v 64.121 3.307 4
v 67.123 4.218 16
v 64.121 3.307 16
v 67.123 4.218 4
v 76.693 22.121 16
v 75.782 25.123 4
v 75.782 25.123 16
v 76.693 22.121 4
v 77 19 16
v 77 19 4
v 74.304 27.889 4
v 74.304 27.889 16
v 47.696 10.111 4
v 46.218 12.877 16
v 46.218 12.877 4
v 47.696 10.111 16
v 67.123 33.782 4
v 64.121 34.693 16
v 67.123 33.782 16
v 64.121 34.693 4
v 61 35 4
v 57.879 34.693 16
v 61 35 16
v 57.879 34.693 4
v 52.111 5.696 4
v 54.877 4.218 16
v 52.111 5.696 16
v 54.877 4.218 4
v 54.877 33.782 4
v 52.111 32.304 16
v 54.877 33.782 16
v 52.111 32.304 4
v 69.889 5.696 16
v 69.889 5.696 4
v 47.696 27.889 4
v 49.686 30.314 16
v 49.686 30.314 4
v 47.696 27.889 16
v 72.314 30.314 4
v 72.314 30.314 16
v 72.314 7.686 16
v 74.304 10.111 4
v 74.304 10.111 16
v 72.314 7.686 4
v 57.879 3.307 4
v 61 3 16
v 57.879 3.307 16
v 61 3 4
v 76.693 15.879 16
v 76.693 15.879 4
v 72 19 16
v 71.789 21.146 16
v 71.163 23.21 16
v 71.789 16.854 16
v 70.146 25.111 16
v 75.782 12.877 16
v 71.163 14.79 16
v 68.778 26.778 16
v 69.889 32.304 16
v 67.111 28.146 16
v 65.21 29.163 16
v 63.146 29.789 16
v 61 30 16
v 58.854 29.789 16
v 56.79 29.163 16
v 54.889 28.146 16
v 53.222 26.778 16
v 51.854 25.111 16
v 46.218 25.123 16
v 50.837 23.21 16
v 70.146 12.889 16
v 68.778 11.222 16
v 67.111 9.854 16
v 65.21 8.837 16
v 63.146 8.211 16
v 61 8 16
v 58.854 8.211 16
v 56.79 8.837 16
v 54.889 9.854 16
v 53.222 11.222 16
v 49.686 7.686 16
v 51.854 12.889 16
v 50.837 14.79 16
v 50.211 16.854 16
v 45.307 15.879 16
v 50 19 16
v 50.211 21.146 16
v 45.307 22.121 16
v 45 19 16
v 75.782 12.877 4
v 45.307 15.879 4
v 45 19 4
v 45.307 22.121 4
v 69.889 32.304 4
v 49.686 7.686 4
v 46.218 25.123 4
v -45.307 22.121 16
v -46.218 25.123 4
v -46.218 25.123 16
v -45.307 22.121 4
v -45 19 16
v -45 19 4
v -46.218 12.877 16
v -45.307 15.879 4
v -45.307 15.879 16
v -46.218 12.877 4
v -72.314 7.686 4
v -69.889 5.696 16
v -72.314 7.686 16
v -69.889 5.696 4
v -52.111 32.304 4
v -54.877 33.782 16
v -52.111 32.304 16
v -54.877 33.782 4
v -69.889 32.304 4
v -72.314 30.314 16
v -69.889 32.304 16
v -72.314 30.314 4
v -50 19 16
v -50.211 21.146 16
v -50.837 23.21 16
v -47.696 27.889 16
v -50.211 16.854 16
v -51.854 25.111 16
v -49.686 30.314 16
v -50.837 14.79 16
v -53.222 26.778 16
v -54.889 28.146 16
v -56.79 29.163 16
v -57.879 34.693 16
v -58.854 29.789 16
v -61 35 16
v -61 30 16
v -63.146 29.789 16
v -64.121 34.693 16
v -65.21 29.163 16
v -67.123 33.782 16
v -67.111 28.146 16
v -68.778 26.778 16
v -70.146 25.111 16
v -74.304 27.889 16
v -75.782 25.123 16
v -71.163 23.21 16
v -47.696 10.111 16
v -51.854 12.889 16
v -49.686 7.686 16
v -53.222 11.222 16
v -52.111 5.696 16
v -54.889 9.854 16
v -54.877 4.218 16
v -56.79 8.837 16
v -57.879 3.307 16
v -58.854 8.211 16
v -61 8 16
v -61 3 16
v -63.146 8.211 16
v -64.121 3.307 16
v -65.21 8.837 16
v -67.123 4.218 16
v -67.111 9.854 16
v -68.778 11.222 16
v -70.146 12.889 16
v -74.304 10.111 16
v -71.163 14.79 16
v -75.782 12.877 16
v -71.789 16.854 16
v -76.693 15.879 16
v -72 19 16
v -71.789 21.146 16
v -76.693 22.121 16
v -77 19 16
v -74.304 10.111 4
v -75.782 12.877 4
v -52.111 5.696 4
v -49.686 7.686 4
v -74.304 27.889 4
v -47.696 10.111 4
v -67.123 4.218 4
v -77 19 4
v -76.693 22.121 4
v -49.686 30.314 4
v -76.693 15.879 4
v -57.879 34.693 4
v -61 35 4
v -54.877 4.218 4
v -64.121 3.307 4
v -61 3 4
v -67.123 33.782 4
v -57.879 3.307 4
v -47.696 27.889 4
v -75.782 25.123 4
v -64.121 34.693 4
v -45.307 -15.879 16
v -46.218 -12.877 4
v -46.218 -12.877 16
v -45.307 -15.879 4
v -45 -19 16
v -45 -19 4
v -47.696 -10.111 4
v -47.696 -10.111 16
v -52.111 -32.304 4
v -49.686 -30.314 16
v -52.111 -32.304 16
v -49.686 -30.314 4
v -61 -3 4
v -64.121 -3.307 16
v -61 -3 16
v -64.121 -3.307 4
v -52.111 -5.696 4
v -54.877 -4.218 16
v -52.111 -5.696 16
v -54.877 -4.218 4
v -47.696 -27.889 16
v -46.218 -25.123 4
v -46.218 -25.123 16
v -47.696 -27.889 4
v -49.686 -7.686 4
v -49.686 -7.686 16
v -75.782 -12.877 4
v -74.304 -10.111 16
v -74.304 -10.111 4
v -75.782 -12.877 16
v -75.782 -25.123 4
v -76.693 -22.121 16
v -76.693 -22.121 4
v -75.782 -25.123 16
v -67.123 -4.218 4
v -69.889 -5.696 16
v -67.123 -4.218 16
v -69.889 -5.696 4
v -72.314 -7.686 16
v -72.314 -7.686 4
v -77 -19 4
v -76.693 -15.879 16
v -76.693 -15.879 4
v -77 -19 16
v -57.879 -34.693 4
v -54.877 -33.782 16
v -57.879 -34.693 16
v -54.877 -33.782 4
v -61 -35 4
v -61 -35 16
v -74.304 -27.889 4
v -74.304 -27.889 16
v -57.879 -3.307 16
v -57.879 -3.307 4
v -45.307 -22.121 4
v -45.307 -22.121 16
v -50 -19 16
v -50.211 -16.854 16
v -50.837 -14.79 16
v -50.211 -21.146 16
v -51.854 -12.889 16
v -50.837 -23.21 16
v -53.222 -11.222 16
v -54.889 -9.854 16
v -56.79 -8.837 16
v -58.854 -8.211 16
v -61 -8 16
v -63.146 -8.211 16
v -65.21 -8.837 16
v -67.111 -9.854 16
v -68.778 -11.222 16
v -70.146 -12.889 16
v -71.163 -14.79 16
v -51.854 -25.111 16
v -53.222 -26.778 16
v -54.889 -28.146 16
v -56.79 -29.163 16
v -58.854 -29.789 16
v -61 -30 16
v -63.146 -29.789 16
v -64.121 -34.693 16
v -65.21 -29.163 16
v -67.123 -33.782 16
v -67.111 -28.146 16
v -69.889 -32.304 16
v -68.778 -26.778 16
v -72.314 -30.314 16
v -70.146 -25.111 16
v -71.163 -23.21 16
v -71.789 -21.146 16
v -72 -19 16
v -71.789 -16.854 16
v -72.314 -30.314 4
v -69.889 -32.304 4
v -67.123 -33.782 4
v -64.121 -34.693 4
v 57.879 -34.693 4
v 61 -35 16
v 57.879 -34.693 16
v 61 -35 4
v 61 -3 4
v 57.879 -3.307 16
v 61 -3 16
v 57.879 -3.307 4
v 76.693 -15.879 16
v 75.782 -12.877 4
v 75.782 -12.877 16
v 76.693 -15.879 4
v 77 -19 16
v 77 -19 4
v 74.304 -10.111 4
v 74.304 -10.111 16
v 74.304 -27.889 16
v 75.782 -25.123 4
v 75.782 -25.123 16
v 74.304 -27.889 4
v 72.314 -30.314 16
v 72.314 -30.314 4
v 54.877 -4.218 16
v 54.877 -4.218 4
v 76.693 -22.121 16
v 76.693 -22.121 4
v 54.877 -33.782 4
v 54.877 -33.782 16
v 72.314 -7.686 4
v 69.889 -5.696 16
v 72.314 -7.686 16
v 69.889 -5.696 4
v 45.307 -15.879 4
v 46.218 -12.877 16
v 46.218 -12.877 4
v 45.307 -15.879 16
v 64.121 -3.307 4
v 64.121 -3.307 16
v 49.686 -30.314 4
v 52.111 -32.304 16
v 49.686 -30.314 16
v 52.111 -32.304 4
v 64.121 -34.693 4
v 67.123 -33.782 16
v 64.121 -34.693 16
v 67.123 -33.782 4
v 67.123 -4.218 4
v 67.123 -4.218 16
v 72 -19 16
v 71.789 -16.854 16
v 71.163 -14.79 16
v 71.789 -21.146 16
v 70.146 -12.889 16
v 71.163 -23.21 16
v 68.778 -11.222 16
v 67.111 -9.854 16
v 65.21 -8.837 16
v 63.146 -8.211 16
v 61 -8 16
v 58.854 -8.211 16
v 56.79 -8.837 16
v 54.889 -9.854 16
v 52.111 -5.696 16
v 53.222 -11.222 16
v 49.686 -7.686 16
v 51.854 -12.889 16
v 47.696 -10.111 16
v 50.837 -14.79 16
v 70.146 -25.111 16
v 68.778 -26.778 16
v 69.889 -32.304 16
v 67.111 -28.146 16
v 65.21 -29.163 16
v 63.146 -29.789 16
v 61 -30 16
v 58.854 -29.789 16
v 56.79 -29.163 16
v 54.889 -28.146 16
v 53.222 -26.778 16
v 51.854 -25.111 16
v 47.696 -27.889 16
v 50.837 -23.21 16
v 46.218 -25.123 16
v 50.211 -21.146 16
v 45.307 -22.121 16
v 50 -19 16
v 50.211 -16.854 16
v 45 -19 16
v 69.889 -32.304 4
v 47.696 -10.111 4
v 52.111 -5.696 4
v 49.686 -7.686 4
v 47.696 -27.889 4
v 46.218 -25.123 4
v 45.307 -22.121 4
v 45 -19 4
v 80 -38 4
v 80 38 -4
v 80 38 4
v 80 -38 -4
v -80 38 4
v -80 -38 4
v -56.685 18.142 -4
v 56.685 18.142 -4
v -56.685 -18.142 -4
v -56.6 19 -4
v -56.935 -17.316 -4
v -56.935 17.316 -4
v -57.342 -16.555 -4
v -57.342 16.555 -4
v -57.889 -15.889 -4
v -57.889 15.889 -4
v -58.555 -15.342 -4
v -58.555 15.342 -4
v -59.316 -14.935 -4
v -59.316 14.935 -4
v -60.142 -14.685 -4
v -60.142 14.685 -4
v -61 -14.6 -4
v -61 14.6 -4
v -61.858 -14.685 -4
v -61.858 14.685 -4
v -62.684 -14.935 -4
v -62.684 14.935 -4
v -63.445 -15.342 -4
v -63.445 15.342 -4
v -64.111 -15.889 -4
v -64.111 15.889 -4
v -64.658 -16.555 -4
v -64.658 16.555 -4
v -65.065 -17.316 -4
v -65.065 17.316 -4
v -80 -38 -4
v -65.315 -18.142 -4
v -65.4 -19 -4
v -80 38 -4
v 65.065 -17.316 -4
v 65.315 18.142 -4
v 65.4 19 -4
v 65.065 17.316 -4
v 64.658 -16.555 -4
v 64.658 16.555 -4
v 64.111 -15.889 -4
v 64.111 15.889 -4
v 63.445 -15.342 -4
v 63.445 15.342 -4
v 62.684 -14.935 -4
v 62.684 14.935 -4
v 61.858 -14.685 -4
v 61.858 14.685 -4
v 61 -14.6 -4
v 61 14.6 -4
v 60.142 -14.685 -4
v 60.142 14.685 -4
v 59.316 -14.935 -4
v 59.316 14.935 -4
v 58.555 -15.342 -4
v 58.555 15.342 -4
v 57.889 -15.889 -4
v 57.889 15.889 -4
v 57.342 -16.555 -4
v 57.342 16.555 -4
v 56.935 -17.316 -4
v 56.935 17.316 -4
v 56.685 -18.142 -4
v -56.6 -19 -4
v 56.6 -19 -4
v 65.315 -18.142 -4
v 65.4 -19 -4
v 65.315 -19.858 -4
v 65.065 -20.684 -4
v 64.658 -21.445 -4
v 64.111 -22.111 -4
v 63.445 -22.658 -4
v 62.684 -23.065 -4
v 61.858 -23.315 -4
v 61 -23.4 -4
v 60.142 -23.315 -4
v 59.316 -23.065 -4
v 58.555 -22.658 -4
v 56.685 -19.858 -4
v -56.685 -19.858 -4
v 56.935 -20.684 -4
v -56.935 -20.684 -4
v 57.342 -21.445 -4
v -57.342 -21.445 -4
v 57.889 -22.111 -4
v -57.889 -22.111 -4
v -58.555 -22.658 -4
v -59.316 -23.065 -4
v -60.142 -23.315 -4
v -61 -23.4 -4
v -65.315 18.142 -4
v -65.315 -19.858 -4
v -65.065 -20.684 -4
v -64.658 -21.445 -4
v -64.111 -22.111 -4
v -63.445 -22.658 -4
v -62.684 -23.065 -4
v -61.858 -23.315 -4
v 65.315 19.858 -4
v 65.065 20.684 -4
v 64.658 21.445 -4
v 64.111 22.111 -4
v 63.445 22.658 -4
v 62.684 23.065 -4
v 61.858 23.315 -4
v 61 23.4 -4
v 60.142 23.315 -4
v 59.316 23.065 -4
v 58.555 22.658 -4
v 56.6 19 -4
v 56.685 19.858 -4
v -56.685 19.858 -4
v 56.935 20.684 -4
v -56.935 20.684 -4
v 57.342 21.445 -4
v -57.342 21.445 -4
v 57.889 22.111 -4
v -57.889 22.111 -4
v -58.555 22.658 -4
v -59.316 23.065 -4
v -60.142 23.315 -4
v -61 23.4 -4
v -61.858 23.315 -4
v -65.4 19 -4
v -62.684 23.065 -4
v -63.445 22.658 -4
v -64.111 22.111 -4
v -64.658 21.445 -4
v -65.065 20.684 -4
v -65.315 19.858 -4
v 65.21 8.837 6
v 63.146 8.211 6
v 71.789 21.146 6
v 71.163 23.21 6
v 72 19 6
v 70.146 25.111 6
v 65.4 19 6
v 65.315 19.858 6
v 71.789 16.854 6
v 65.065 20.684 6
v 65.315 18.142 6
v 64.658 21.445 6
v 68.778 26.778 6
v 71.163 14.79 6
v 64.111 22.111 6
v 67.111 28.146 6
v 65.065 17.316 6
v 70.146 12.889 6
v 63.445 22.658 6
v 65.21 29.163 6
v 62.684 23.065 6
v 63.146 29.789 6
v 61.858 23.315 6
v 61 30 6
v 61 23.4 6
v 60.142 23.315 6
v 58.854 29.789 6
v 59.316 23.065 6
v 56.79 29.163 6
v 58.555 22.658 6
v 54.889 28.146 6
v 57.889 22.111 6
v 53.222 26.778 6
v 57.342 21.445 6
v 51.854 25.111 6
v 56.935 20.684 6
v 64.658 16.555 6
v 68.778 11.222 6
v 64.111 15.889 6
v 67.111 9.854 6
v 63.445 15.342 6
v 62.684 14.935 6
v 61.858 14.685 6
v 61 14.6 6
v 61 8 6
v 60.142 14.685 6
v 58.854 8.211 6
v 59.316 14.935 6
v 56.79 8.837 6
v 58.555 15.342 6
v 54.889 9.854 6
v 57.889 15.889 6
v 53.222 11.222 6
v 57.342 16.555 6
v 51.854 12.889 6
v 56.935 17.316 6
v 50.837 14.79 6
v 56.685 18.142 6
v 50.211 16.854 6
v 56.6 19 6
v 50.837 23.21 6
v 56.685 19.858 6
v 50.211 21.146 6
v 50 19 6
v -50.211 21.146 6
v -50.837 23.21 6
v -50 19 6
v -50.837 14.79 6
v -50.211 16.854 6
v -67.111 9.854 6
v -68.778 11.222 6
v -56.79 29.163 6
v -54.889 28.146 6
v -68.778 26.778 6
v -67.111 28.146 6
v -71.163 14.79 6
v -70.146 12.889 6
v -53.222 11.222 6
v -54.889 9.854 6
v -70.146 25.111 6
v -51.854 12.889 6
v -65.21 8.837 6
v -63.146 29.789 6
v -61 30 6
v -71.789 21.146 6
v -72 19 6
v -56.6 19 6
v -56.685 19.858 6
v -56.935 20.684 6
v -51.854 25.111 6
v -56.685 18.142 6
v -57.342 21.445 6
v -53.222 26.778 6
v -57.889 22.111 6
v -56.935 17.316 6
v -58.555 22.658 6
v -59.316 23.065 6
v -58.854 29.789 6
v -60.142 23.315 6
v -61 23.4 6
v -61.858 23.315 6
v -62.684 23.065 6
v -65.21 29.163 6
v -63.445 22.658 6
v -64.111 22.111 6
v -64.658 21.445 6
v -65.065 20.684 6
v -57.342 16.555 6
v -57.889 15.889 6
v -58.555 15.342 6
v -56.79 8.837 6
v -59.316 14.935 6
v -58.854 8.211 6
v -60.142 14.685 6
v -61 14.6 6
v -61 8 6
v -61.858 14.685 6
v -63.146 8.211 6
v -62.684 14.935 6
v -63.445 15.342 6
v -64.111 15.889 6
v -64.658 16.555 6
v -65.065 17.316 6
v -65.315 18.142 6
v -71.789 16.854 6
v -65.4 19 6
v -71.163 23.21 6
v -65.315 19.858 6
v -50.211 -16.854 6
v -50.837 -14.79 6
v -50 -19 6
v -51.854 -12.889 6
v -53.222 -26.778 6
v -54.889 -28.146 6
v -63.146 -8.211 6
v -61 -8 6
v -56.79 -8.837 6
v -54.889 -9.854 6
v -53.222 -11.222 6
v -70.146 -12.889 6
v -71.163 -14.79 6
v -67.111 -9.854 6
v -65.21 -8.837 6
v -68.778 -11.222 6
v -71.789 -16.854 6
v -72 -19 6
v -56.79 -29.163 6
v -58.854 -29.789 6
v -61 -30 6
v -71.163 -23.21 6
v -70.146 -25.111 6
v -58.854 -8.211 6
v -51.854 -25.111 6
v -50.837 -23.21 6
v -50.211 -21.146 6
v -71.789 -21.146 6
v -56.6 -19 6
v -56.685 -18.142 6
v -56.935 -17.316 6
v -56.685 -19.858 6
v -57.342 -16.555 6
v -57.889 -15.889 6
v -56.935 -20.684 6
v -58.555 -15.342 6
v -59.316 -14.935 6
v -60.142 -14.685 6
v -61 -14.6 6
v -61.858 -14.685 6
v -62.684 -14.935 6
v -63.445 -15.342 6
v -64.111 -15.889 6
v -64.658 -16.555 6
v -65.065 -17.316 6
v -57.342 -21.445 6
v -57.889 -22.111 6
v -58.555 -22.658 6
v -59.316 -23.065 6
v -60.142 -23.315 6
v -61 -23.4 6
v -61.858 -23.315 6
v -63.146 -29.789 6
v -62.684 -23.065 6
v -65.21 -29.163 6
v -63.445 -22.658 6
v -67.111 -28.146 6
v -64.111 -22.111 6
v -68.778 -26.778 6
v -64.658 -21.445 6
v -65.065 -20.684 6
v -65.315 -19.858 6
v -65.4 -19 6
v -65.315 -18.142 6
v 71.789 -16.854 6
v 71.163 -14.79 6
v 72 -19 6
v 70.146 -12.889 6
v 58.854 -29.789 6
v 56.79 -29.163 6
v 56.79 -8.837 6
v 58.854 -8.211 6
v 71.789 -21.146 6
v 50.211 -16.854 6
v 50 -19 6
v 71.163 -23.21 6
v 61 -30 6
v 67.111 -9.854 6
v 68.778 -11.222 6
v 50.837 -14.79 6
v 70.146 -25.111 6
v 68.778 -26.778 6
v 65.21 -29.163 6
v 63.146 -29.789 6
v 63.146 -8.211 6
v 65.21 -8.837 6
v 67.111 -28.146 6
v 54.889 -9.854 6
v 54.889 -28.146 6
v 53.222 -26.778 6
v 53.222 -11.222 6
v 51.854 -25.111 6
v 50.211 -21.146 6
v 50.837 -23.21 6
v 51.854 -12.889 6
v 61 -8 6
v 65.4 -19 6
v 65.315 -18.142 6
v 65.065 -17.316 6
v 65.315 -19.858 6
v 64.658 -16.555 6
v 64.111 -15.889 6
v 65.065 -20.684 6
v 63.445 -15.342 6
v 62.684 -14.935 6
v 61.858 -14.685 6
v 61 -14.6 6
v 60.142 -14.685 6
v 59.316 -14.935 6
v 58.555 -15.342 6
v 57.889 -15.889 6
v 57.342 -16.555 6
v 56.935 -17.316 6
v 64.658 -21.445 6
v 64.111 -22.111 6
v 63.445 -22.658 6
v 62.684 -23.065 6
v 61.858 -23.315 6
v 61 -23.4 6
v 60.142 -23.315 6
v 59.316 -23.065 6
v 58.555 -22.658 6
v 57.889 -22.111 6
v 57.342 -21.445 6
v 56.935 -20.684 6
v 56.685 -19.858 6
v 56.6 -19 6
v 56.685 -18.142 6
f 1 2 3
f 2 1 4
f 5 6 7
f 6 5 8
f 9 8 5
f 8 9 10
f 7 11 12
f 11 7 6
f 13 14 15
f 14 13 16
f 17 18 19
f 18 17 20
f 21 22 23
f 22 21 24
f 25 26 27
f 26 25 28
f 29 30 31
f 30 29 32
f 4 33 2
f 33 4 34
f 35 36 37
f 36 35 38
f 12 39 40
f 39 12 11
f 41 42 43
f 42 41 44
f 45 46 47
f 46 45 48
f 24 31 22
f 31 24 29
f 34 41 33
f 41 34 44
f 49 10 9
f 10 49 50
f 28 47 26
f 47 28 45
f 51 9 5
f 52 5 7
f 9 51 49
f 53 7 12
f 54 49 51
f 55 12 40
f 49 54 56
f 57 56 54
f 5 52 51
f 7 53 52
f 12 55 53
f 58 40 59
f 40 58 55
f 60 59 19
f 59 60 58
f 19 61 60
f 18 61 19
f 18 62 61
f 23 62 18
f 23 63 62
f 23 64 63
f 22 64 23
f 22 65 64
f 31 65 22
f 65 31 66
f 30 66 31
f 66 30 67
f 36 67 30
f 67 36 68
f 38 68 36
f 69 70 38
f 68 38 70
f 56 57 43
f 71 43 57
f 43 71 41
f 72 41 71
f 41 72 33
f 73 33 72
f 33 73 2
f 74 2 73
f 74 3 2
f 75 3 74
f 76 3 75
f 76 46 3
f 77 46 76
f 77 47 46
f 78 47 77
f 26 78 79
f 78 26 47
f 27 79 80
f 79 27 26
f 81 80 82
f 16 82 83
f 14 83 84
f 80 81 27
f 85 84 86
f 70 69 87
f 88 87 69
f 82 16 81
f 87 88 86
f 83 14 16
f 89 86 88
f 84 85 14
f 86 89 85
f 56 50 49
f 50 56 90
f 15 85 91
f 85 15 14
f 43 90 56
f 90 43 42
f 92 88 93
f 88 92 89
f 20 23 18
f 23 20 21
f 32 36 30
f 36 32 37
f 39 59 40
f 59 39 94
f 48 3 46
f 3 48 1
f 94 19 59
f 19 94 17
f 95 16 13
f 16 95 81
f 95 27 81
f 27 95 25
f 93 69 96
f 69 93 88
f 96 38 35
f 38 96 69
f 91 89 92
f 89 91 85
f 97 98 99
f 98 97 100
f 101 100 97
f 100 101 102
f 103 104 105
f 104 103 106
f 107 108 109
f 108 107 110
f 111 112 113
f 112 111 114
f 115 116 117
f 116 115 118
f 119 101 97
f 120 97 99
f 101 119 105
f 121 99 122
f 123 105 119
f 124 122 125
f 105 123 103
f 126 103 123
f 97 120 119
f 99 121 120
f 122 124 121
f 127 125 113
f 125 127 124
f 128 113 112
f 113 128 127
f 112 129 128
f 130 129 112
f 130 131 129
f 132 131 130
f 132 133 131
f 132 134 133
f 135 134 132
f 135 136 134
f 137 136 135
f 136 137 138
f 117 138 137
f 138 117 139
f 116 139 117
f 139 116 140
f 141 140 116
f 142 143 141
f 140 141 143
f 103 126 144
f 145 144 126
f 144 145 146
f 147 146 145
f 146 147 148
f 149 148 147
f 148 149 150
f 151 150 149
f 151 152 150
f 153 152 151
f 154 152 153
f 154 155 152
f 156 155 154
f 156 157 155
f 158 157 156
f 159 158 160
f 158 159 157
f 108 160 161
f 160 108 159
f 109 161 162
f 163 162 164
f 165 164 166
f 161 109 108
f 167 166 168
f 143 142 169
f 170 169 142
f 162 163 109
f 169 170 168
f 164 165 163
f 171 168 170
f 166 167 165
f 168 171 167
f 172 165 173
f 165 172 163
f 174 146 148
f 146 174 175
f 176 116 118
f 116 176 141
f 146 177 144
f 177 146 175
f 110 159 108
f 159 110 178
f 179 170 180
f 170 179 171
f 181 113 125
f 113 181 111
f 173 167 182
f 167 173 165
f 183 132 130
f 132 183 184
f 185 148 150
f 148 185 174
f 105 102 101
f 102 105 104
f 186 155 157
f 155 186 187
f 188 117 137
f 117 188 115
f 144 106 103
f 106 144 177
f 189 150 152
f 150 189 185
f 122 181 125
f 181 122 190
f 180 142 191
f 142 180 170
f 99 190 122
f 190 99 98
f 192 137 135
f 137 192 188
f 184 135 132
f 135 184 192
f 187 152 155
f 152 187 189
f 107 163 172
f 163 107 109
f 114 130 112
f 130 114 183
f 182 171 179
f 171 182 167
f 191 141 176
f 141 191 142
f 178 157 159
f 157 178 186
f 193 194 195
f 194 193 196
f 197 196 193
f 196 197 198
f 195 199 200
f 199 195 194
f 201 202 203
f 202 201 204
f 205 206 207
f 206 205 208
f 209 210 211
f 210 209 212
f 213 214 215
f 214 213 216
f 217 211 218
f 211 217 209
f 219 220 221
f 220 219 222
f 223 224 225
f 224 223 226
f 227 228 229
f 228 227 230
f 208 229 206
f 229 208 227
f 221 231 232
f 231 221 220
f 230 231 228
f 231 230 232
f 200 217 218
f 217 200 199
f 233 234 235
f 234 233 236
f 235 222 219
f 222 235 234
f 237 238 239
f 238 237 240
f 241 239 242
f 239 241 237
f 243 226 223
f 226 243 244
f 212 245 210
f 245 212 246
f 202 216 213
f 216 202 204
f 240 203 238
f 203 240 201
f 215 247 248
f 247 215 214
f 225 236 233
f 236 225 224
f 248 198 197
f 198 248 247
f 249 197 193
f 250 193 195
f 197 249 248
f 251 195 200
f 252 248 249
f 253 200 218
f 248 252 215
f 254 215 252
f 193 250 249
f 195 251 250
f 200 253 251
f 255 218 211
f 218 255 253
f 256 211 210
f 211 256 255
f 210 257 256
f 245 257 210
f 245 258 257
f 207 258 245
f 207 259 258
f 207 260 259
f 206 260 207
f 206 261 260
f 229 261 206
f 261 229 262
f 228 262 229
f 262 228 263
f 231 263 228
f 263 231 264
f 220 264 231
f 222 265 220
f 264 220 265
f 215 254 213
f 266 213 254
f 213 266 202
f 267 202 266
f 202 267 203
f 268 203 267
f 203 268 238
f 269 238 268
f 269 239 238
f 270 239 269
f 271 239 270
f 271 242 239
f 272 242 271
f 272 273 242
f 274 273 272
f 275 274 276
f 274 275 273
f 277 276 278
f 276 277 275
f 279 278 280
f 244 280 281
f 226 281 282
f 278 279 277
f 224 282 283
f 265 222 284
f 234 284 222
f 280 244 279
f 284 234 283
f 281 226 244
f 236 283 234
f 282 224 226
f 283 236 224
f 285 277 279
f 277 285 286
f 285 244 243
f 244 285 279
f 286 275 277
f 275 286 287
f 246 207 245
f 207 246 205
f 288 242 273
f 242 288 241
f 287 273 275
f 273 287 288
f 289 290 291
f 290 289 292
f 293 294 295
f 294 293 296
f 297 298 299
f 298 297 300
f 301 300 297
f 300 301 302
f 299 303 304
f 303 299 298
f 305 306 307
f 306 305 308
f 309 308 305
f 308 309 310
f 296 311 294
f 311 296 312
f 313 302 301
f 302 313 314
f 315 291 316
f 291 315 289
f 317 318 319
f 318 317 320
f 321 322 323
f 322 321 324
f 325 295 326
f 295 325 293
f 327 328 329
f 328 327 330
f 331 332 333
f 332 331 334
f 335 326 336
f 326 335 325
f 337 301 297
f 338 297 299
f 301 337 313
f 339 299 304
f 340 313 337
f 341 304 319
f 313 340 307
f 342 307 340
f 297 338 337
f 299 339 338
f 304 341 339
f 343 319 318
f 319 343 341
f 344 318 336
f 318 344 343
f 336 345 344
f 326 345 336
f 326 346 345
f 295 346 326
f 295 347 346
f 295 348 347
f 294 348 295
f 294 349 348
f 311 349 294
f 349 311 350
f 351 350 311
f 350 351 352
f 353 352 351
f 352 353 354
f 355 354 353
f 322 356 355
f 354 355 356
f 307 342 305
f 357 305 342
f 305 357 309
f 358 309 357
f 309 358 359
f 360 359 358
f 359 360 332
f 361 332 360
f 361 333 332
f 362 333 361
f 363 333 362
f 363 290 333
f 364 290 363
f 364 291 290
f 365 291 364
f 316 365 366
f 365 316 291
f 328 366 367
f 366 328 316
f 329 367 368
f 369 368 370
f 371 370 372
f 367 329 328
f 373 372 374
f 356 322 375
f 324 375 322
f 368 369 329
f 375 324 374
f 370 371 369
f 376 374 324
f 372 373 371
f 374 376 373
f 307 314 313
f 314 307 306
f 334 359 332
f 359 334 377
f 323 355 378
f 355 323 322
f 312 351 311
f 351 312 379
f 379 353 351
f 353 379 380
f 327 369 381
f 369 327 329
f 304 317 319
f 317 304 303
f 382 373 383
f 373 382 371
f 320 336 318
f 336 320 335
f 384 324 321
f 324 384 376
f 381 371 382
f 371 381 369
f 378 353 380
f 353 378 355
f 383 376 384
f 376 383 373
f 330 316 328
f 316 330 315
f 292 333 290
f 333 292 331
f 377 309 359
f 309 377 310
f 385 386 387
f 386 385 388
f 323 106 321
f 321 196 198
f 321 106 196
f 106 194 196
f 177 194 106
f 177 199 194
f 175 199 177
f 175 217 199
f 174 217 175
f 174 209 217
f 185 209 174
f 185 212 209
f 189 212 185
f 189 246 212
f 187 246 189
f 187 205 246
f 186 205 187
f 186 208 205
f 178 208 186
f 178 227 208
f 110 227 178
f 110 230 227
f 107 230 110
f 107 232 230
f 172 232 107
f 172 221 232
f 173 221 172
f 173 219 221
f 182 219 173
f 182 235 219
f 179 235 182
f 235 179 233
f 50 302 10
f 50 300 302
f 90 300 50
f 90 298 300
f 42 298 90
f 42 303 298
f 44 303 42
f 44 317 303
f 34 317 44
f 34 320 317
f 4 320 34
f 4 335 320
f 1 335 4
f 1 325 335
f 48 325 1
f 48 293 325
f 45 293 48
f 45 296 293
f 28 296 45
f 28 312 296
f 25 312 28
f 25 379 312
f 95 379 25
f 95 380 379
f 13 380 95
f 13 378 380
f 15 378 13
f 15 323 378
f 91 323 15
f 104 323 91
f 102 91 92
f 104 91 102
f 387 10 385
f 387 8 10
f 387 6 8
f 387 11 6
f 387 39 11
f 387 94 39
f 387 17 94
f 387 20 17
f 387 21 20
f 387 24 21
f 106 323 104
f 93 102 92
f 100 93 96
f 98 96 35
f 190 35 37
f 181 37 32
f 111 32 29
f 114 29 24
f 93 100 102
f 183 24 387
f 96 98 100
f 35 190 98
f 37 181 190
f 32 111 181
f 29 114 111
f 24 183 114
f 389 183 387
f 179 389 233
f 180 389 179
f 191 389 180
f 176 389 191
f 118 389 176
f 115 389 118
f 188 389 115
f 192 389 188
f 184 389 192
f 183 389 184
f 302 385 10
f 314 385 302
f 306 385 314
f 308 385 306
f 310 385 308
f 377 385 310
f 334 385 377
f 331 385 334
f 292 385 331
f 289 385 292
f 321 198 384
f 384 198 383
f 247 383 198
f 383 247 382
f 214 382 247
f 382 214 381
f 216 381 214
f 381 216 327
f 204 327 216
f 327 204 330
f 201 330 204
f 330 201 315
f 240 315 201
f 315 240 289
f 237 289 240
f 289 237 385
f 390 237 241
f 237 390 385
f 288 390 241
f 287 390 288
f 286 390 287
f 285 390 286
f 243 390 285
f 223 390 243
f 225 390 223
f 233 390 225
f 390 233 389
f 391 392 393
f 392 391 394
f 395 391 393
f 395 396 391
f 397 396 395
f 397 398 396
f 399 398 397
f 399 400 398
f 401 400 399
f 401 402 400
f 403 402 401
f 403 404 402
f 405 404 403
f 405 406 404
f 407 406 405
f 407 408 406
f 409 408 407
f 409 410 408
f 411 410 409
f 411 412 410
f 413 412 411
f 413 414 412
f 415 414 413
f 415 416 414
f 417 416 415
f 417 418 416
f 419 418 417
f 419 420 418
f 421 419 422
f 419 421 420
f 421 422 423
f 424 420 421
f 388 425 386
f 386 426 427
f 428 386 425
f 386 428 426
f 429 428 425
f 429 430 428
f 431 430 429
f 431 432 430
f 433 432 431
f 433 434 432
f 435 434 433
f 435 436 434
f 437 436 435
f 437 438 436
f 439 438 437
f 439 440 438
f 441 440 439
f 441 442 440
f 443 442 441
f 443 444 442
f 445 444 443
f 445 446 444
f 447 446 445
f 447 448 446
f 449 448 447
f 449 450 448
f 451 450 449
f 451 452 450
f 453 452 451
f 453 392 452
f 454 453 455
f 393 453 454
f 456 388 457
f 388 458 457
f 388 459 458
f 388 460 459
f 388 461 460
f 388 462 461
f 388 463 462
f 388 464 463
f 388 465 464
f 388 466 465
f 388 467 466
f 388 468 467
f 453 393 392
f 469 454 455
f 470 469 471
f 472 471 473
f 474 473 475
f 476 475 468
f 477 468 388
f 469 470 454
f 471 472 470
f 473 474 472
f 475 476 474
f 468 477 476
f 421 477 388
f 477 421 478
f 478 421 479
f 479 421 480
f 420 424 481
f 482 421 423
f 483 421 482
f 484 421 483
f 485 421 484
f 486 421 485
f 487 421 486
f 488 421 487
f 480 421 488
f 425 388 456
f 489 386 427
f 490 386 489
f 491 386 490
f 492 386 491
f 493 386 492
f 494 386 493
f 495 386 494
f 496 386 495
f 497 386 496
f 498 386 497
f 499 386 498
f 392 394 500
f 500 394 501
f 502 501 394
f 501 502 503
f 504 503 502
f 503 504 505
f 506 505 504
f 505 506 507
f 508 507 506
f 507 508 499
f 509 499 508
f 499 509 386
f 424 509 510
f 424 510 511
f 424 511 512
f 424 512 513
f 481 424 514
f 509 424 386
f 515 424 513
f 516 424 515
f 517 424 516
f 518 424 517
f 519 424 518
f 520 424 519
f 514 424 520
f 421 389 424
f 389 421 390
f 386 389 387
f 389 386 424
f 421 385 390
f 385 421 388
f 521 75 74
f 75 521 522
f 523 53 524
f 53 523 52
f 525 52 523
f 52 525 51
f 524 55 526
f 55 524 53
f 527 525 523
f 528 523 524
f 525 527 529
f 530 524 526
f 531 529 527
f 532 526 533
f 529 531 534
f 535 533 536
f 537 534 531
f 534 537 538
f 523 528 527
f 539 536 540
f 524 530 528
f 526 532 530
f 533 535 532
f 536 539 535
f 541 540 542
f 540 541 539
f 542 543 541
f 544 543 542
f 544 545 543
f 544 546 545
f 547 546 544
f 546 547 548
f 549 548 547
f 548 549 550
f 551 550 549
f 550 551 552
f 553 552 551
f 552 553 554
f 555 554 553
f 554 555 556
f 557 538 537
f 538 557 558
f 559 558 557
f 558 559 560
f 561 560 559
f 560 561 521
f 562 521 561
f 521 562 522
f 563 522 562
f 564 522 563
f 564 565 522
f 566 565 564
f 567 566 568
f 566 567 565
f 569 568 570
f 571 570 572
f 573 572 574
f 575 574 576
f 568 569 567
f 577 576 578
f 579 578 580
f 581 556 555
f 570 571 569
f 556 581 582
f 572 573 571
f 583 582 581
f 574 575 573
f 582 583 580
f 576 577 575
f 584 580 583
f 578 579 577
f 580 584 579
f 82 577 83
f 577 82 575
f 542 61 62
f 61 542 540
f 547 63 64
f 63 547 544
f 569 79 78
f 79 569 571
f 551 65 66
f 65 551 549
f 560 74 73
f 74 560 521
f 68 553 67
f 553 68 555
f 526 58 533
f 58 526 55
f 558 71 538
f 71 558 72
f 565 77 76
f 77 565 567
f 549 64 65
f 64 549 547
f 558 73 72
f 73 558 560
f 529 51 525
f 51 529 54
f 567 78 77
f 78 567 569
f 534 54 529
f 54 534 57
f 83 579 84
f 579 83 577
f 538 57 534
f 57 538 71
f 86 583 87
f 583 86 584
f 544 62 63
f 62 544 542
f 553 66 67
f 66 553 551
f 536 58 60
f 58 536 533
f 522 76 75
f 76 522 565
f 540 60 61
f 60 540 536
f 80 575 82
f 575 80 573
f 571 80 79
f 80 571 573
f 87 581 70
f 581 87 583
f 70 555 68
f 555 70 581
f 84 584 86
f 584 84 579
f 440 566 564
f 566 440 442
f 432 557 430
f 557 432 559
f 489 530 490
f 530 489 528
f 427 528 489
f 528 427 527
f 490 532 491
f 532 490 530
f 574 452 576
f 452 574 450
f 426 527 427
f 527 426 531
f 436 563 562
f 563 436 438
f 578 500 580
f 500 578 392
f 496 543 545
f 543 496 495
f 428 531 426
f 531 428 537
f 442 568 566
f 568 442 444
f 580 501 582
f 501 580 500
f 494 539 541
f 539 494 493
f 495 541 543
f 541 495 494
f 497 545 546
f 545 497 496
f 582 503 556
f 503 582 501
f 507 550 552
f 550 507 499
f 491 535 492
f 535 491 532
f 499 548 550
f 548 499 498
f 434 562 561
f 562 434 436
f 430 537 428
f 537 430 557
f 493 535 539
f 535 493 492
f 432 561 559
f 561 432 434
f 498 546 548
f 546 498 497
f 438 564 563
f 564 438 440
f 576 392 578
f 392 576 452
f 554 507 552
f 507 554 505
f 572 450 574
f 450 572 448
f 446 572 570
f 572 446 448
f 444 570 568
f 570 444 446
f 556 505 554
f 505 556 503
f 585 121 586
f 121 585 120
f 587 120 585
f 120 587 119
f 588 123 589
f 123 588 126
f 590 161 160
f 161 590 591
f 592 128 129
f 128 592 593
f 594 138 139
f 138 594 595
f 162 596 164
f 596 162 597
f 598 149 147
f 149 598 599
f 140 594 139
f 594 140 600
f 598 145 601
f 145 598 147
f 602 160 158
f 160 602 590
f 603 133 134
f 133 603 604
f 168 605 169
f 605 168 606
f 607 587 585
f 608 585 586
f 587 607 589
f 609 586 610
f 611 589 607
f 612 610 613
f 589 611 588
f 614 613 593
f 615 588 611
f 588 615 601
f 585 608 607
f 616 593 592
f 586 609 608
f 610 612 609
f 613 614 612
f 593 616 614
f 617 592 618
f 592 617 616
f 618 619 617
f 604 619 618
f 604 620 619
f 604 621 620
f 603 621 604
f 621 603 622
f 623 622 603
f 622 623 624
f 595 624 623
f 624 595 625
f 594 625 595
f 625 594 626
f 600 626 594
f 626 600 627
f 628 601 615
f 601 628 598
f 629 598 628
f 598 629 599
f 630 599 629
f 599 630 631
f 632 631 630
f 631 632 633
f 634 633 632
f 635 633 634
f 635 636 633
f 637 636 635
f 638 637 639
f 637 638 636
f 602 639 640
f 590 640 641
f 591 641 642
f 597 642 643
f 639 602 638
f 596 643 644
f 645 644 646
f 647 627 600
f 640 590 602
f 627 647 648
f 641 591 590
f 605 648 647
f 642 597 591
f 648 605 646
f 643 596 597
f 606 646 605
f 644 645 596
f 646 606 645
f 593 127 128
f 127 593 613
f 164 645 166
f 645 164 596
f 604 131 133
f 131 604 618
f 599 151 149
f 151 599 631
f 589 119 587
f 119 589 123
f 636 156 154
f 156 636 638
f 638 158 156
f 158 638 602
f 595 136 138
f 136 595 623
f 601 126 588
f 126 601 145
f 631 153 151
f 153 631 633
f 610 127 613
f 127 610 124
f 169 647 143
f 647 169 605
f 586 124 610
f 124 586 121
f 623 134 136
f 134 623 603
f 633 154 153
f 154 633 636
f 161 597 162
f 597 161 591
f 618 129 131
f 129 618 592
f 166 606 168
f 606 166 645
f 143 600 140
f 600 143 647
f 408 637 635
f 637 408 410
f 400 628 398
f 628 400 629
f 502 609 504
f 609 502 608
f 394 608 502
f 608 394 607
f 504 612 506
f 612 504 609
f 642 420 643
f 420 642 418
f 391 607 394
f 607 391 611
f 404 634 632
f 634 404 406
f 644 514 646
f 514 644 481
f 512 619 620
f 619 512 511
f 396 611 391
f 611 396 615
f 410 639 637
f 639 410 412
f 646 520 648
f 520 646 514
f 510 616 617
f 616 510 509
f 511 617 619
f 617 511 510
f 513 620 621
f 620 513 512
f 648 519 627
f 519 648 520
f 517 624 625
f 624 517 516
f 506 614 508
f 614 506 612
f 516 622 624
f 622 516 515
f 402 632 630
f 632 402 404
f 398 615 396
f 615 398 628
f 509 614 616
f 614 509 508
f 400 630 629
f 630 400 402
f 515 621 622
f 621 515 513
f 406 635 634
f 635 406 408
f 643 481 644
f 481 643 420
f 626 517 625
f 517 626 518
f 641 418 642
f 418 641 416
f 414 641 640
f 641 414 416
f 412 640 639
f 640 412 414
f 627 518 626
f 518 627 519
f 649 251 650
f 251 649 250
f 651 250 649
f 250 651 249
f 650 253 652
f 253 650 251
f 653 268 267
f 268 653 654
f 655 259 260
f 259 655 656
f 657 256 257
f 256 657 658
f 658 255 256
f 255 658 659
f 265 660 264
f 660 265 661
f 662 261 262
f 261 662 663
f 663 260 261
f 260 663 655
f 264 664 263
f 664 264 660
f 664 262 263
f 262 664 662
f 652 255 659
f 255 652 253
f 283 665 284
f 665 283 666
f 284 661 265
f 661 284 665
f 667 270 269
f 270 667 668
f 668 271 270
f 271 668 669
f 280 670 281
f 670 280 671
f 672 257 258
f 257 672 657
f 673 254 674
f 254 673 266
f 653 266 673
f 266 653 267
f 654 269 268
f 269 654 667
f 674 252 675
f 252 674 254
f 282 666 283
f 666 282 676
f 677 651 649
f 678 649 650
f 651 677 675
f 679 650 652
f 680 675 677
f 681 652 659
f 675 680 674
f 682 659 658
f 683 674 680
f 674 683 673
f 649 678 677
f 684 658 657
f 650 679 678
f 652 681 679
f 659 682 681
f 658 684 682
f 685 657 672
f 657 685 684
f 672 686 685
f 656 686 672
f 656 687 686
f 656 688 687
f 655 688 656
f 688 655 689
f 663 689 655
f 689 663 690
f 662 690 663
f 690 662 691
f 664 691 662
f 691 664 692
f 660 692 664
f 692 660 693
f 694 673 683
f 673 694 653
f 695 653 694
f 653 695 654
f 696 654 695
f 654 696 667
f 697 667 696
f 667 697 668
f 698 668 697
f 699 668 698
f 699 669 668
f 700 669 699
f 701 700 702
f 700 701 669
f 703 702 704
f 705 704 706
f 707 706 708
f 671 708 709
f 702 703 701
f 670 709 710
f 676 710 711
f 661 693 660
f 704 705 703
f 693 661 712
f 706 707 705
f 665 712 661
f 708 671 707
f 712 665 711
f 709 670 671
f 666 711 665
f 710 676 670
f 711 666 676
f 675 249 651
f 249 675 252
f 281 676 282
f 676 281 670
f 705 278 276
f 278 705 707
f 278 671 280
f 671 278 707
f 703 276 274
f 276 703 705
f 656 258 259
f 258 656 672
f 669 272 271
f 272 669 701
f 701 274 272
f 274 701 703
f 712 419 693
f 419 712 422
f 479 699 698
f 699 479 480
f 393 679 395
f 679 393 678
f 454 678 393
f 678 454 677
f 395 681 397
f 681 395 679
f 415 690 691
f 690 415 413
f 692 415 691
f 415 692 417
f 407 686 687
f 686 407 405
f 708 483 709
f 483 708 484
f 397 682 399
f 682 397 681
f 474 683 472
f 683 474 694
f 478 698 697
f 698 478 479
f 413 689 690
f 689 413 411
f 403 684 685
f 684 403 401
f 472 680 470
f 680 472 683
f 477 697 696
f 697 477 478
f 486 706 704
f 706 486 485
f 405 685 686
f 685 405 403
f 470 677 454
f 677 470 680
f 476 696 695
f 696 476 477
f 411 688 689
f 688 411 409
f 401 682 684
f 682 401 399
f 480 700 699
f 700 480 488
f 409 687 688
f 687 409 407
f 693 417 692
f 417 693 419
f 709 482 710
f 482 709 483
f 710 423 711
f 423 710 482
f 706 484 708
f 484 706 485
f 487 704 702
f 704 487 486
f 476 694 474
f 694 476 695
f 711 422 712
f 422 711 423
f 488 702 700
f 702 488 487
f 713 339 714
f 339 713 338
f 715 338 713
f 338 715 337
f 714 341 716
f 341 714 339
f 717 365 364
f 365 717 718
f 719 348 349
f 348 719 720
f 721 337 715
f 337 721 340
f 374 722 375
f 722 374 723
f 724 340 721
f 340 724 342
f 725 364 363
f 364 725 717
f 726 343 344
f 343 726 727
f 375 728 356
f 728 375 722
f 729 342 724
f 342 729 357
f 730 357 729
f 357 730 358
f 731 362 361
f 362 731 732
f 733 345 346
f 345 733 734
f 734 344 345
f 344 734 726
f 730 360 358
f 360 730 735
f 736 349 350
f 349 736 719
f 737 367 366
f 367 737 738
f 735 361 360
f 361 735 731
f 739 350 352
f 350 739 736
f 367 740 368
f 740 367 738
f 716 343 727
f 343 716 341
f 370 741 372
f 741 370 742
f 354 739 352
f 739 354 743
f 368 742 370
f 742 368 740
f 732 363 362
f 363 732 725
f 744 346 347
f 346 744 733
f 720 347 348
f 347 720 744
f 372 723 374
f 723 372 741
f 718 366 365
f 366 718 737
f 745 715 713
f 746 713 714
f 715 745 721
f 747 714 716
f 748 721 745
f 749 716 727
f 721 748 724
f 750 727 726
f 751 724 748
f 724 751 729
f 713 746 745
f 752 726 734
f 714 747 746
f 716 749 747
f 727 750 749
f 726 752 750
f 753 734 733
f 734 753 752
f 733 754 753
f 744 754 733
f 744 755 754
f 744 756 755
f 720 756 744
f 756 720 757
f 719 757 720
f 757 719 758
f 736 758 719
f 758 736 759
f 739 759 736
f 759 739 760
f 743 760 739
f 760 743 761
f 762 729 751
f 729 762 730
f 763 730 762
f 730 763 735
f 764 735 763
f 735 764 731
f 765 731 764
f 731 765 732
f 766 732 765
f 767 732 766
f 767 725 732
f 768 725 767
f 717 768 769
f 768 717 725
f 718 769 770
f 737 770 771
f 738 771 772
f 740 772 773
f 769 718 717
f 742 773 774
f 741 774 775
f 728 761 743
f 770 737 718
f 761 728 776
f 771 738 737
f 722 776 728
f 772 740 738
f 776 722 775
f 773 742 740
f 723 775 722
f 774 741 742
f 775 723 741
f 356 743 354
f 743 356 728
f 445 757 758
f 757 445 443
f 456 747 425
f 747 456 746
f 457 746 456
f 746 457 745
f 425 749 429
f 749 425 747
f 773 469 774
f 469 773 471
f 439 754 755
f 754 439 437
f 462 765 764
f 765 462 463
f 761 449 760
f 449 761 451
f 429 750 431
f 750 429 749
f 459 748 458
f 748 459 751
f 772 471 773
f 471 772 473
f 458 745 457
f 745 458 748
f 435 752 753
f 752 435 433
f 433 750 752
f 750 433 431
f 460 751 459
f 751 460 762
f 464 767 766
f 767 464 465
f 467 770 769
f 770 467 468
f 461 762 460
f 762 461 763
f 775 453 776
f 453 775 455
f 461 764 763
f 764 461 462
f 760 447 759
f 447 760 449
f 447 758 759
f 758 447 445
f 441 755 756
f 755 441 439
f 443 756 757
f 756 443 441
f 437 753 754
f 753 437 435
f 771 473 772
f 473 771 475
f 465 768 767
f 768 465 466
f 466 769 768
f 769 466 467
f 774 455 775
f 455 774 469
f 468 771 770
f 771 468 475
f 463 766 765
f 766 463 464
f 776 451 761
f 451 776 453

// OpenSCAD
$fn = 32;

// ----------------------------------------------------------------------
// Socket pad plate
// bosses with counterbored sockets for the screws
// ----------------------------------------------------------------------

// --- parameters (mm) ---
base_t = 8;            // base plate thickness
boss_h = 12;           // boss height above the base plate
boss_d = 32;           // boss diameter
socket_d = 22;         // socket diameter
socket_depth = 10;     // socket depth from the boss face
bolt_d = 8.8;          // screw clearance hole through the socket floor
plate = [160, 76, 8];  // overall size (x, y, z)
edge = 19;             // boss centre offset from the plate edge
pads = 4;              // boss count, one per corner

// --- derived feature positions (mm) ---
height = base_t + boss_h;        // = 20   overall height of the part
corner_x = plate[0] / 2 - edge;  // = 61   boss centre X
corner_y = plate[1] / 2 - edge;  // = 19   boss centre Y
feature_centers = [
  [corner_x, corner_y],
  [-corner_x, corner_y],
  [-corner_x, -corner_y],
  [corner_x, -corner_y]
];   // boss centres: sockets, holes and the pads themselves are placed from here

// base plate, bosses on feature_centers, socket + through hole in each
difference() {
  union() {
    cube(plate, center = true);
    for (centre = feature_centers)
      translate([centre[0], centre[1], plate[2] / 2 - 1])
        cylinder(d = boss_d, h = boss_h + 1);
  }
  for (centre = feature_centers) {
    translate([centre[0], centre[1], plate[2] / 2 + boss_h - socket_depth])
      cylinder(d = socket_d, h = socket_depth + 1);
    translate([centre[0], centre[1], -height])
      cylinder(d = bolt_d, h = 2 * height + 2);  // through the socket floor
  }
}
